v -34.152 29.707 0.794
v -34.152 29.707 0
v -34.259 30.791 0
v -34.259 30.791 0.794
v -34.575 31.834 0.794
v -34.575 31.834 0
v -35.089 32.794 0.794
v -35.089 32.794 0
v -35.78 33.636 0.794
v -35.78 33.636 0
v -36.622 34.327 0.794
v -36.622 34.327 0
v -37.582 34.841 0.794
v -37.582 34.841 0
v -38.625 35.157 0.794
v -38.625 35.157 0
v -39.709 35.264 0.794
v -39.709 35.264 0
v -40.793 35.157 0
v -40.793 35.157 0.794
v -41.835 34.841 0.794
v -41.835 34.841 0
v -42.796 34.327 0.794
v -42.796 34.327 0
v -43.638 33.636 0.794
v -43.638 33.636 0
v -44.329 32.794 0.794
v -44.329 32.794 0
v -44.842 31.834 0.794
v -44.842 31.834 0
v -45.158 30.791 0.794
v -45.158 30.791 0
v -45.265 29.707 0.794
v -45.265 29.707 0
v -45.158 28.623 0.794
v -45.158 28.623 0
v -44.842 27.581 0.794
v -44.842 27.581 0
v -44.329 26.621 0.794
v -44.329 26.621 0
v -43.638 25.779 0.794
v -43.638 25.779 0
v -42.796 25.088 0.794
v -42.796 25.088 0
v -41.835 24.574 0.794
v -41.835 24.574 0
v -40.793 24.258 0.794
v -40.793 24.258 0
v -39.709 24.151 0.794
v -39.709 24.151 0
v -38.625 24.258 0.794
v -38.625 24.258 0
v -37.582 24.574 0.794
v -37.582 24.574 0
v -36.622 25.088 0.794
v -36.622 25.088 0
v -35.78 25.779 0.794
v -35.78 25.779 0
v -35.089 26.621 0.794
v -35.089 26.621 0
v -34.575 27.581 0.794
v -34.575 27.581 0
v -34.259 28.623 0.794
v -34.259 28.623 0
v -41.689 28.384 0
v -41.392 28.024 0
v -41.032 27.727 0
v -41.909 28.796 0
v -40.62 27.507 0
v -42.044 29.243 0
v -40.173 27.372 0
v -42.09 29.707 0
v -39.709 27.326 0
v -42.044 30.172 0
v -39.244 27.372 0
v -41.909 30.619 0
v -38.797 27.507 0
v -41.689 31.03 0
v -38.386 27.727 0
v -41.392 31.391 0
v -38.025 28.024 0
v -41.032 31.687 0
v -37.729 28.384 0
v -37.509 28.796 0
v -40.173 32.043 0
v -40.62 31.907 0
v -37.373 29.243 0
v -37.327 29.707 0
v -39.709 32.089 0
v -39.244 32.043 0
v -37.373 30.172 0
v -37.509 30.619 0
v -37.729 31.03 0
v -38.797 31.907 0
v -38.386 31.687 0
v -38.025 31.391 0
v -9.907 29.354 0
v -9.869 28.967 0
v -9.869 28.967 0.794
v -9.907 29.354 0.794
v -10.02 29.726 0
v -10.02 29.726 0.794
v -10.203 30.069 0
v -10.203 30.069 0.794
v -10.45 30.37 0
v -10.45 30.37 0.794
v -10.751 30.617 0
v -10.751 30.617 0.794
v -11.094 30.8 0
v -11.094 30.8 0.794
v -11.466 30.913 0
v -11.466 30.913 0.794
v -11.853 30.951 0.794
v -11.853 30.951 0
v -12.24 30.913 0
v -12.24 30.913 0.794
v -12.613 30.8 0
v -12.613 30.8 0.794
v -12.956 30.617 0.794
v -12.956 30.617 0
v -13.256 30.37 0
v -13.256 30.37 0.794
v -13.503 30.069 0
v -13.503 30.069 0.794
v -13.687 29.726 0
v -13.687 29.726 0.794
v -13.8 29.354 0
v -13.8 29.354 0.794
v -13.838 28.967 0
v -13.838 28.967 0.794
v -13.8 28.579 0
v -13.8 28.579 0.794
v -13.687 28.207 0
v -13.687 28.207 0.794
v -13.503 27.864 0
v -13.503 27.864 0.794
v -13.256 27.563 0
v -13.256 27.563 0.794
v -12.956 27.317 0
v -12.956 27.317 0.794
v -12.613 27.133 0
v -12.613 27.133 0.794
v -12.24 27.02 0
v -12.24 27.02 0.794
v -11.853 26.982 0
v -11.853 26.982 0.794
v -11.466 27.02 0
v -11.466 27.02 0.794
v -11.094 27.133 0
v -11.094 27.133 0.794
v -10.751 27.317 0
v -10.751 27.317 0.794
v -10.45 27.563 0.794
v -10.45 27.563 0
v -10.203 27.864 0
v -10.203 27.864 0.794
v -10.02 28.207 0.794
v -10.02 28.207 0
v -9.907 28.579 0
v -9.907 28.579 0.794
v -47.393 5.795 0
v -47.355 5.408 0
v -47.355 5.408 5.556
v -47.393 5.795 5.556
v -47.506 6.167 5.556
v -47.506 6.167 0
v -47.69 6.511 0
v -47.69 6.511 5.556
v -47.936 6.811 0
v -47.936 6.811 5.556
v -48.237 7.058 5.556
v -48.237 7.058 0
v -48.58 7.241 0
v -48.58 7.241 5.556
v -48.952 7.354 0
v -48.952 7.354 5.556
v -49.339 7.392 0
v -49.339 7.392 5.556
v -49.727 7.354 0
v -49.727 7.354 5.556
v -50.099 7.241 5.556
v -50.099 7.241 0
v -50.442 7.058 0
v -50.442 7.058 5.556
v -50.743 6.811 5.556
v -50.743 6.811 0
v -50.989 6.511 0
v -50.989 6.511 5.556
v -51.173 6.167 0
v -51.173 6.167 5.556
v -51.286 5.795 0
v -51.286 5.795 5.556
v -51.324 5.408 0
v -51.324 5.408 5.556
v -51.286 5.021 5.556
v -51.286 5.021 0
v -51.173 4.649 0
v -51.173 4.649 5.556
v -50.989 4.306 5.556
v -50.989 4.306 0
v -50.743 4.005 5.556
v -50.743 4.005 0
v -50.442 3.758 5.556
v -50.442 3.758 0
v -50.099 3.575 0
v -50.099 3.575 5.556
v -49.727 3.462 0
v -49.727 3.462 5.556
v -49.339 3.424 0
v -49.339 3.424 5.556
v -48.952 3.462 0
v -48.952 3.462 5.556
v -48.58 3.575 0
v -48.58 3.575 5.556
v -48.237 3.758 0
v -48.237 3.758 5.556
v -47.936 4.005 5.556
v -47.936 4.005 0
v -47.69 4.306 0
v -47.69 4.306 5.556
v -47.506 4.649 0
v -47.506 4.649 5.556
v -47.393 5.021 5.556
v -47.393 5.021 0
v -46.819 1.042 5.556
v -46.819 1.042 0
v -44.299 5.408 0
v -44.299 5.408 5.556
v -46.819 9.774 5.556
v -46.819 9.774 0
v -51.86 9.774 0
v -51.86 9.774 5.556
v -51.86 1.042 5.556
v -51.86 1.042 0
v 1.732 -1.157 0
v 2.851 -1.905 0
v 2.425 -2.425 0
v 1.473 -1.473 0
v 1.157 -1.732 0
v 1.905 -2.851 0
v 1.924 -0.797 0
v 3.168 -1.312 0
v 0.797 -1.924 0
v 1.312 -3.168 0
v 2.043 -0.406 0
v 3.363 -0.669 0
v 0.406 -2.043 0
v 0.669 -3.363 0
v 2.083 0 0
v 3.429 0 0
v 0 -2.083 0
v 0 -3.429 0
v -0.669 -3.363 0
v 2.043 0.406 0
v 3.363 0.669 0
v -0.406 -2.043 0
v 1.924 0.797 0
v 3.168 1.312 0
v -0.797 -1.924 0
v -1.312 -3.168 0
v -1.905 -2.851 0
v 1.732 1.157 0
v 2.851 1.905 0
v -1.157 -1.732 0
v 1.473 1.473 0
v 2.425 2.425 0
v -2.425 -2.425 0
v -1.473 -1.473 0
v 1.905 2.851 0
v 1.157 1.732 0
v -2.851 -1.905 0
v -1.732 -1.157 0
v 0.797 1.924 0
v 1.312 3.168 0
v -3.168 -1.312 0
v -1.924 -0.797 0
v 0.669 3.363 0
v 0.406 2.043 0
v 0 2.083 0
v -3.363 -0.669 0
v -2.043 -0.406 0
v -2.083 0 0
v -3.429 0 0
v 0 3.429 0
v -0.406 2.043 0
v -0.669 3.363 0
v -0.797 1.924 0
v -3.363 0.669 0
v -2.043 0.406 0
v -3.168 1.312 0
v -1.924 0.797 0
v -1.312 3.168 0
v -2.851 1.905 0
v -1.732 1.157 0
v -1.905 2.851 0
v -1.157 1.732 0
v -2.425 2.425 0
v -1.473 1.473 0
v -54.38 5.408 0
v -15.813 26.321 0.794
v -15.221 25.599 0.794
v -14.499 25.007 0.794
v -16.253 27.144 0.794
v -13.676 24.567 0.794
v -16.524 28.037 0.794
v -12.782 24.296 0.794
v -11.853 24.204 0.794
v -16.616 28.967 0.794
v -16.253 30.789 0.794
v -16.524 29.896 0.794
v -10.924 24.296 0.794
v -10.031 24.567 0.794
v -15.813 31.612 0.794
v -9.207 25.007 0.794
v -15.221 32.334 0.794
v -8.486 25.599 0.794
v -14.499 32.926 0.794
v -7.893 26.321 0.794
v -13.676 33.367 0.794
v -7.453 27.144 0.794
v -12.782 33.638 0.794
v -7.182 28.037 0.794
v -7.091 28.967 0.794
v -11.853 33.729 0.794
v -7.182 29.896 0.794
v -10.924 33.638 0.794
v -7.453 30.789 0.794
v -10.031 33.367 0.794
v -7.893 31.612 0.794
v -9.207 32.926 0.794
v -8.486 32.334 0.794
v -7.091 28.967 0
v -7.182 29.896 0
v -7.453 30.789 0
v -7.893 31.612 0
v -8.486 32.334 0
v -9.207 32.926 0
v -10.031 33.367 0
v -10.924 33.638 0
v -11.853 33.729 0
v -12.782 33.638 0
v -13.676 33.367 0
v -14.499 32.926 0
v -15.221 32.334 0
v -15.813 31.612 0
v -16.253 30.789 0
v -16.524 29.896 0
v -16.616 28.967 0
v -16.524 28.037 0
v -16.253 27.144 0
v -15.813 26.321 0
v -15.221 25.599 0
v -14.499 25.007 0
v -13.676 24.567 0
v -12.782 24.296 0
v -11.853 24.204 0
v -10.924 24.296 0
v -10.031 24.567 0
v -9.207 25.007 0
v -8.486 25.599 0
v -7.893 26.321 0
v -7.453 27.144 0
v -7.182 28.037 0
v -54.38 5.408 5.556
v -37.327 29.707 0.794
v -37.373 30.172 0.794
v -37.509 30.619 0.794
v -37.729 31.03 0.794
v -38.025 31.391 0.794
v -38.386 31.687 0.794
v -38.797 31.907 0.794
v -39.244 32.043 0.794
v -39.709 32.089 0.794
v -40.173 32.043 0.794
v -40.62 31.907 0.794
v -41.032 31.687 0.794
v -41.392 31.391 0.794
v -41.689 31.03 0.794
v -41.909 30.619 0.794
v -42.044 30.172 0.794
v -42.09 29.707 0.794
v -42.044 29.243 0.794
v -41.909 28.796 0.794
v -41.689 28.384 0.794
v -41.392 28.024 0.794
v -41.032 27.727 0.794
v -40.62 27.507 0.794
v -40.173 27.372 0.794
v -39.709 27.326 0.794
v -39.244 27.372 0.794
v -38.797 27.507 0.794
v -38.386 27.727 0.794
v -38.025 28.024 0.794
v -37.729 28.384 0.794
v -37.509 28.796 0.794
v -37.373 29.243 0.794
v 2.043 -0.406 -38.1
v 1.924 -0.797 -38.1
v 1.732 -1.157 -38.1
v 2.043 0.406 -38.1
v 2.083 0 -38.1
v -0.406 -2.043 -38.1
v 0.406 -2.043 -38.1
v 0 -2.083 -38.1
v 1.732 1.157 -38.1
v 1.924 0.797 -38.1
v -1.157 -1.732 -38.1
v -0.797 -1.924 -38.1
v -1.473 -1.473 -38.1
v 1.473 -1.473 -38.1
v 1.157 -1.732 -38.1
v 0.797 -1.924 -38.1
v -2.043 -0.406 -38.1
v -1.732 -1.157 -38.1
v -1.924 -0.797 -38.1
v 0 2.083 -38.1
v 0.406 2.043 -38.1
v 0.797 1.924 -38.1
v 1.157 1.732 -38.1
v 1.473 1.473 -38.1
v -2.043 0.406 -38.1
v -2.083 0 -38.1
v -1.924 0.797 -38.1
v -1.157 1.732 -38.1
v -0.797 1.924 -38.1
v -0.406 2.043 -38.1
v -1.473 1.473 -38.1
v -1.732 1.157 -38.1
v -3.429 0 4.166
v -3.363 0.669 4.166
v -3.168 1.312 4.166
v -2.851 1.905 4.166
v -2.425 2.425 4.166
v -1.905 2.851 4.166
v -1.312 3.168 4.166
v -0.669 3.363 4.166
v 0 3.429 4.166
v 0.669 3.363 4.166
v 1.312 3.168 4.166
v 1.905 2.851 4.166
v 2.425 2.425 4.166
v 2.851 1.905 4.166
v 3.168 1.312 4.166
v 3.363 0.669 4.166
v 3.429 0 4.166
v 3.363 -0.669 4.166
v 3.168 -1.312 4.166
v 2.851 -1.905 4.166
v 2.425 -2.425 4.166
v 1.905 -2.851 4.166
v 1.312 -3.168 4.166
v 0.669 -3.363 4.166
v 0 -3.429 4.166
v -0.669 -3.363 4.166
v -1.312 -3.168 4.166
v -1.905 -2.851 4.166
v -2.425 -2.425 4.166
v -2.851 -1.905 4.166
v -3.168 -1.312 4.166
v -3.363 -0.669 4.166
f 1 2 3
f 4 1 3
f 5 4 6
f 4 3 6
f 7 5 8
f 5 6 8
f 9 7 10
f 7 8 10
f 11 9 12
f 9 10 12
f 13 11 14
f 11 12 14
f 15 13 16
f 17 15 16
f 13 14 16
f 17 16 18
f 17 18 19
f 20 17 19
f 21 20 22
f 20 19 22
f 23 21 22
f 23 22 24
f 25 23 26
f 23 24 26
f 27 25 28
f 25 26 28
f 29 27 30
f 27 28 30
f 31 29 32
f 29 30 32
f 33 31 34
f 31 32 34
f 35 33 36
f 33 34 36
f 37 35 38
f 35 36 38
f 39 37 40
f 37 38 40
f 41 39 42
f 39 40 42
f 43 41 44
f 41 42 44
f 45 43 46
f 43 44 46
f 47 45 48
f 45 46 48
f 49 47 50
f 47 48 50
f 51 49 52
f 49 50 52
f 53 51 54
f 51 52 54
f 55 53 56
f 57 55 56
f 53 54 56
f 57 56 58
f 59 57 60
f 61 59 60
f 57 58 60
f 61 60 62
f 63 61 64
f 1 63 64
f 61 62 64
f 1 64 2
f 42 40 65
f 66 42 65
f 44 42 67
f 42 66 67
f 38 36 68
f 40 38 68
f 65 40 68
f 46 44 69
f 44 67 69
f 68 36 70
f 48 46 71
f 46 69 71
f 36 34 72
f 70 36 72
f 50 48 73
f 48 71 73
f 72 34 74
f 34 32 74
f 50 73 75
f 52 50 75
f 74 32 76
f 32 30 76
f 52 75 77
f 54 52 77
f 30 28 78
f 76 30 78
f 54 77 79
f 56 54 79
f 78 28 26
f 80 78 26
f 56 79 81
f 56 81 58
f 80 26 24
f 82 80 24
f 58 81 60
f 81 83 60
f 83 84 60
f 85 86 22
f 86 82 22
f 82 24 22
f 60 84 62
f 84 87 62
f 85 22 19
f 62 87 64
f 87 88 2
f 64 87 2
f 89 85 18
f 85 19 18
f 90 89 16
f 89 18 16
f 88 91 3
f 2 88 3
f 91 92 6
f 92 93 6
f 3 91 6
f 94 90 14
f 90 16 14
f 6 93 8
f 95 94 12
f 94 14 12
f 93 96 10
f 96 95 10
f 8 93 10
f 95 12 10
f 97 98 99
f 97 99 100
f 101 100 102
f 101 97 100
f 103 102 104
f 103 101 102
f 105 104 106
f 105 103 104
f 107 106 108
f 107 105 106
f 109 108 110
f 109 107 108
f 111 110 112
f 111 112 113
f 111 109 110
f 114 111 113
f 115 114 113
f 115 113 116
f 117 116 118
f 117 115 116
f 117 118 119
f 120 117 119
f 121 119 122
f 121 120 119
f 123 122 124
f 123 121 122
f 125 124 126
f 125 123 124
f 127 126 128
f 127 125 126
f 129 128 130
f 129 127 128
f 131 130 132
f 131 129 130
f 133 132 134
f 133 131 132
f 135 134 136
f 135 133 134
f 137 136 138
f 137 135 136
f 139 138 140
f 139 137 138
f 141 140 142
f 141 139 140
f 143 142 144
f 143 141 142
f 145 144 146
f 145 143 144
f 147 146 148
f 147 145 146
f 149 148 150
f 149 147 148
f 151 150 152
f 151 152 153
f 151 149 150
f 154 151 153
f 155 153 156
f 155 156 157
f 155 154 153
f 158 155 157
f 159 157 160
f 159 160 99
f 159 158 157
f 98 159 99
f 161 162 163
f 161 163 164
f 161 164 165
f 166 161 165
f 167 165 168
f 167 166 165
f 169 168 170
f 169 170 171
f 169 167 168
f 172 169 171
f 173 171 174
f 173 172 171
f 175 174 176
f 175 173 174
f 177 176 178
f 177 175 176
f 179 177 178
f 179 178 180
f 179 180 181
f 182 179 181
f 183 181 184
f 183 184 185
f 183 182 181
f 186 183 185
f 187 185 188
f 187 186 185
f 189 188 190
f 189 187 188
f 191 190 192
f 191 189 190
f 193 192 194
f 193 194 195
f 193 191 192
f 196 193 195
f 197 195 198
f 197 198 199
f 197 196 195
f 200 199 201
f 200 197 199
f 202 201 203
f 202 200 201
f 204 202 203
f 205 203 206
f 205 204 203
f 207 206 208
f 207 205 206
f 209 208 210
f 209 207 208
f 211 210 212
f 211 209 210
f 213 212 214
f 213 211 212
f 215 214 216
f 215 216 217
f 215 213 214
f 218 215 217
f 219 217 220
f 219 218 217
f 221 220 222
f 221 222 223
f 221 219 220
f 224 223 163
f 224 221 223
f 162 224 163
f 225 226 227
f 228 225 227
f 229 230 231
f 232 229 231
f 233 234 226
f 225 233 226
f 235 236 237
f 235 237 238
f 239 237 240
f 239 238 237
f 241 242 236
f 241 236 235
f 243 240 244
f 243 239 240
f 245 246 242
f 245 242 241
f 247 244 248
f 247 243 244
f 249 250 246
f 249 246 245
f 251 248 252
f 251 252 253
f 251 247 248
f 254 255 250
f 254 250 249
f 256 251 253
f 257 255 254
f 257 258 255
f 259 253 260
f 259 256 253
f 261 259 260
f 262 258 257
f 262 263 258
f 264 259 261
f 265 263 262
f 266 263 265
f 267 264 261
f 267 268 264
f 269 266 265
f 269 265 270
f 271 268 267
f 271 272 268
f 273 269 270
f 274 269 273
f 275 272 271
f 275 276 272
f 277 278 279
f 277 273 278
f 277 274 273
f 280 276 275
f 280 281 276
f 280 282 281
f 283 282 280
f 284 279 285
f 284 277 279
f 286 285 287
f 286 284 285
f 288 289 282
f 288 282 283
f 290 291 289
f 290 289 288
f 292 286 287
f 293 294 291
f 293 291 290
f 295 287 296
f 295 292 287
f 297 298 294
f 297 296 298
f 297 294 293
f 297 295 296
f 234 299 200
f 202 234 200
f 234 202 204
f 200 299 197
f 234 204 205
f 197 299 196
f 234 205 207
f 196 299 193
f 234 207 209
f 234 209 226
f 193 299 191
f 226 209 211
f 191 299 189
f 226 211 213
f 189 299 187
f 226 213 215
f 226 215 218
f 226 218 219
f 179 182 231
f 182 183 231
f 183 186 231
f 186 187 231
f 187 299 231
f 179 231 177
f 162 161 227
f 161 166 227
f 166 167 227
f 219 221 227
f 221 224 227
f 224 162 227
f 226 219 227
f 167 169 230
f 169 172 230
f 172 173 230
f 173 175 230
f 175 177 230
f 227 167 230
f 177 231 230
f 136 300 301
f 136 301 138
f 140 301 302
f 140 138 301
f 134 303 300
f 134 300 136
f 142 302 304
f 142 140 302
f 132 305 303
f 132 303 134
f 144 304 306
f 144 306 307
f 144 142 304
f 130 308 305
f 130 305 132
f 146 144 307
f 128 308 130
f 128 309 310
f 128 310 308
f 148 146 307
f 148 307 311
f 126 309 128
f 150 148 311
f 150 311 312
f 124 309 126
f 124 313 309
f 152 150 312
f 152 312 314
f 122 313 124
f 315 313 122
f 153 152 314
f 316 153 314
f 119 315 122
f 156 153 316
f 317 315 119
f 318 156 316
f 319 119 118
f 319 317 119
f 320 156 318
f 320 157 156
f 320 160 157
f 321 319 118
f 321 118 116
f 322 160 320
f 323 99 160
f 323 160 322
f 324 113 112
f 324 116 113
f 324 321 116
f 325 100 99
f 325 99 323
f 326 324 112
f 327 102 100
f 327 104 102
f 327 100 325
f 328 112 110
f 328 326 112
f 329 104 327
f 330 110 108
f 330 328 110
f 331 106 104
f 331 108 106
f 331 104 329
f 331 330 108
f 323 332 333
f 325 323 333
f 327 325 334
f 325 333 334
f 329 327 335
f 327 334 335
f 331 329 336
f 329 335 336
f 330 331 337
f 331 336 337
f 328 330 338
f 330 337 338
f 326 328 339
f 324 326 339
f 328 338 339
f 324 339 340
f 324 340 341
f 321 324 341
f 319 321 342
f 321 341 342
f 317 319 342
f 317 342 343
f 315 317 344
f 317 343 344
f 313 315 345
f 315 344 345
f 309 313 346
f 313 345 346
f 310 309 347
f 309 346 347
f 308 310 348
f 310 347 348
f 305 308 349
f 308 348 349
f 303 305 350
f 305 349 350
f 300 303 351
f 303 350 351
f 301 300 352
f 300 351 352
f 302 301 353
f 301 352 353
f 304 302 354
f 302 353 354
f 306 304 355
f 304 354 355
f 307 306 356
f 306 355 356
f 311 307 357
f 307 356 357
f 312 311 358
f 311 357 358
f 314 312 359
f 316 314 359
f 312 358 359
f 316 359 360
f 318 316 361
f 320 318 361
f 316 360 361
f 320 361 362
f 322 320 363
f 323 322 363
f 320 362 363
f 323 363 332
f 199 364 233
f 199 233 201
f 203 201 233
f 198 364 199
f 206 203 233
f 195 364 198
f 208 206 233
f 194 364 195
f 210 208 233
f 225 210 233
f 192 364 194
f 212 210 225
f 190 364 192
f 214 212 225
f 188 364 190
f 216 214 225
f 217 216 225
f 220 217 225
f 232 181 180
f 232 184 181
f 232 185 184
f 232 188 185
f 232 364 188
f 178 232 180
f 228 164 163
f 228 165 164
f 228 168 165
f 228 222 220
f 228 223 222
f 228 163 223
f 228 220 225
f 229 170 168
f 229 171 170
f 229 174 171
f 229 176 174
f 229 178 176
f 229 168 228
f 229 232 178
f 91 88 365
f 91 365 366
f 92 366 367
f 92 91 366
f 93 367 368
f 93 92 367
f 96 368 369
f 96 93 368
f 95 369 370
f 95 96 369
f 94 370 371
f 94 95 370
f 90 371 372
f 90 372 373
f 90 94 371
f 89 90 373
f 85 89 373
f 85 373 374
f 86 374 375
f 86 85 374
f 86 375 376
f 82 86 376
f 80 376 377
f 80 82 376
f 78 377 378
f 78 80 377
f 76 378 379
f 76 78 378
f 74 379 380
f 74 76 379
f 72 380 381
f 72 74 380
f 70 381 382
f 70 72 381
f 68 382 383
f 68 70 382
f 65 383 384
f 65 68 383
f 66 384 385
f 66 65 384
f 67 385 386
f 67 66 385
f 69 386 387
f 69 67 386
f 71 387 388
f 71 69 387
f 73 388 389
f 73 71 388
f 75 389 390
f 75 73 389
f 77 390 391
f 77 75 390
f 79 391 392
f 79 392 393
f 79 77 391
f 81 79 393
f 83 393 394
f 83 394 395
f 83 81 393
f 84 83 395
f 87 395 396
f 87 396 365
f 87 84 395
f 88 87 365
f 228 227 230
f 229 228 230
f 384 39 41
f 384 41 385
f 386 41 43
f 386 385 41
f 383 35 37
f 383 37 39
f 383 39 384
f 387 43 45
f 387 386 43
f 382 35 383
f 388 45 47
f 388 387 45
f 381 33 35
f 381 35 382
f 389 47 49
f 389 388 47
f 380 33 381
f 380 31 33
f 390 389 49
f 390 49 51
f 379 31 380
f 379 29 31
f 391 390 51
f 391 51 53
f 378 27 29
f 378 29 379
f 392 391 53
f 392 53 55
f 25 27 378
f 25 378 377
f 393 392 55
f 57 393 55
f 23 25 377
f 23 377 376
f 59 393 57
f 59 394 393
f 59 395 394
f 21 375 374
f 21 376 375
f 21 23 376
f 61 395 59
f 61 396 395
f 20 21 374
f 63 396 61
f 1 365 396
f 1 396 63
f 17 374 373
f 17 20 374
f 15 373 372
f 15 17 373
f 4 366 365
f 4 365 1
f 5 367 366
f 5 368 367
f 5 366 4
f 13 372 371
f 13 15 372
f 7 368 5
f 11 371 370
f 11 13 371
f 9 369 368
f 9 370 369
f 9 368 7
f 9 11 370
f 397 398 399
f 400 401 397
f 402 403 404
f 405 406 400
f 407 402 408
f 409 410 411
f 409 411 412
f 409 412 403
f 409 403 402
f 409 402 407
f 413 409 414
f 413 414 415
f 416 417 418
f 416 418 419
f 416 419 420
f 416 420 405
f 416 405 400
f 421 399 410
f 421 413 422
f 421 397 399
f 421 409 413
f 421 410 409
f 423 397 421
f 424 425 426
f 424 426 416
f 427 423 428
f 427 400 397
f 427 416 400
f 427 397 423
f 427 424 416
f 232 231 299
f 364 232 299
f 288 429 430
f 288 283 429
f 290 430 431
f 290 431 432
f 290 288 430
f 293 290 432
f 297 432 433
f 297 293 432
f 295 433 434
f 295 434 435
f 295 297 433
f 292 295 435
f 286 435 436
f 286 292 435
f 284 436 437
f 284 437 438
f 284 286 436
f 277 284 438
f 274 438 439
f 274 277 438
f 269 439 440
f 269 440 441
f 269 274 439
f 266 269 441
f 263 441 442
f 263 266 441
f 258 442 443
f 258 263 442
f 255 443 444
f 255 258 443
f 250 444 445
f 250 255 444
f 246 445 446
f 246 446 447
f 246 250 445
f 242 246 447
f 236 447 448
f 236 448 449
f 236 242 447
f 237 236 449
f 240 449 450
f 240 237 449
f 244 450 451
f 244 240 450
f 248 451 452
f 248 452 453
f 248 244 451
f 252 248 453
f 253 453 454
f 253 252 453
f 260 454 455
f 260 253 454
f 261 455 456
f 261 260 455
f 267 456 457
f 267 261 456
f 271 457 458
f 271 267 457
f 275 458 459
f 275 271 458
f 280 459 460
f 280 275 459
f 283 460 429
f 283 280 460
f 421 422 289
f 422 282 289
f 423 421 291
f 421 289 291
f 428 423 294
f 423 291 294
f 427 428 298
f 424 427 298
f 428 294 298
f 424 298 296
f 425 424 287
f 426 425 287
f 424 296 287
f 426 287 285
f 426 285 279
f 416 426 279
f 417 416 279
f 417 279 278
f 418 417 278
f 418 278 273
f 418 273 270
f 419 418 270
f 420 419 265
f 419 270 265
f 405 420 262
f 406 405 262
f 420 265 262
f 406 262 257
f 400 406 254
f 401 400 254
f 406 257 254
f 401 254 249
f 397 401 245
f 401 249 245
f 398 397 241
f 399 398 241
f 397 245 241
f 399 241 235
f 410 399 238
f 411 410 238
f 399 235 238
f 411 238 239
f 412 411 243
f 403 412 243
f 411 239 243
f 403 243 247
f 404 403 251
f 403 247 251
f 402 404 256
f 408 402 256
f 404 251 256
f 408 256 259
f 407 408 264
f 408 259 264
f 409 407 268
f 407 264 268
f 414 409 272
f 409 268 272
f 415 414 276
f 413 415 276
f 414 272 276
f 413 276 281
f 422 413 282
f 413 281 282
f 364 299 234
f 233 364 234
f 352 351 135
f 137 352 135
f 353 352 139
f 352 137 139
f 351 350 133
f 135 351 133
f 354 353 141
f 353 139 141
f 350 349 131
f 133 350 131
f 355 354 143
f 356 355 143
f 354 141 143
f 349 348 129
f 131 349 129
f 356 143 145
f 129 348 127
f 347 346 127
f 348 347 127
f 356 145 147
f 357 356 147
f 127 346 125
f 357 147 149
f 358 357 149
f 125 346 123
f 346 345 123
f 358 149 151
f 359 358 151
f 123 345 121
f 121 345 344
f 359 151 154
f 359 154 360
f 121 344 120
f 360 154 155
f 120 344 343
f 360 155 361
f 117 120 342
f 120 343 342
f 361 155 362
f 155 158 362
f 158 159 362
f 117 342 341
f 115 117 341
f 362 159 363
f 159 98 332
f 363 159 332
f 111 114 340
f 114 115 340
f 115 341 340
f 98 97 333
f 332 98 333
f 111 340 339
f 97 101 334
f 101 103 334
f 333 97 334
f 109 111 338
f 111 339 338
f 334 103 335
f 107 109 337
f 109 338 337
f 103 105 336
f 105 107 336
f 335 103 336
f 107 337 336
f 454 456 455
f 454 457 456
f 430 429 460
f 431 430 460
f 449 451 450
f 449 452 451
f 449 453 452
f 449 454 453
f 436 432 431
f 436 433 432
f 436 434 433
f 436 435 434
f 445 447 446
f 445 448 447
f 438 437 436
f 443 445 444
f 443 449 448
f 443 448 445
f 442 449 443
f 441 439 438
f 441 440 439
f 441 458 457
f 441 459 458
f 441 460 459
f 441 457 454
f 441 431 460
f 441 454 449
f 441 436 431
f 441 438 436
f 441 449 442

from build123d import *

# Parameters (mm, degrees)
F0_W     = 2.0828
F0_H     = 38.1
F2_R     = 5.55625
F2_R_2   = 2.38125
F3_DEPTH = 0.79375
F4_R     = 4.7625
F4_R_2   = 1.984375
F5_DEPTH = 0.79375
F6_R     = 1.984375
F7_DEPTH = 5.55625


with BuildPart() as f1:
    # F0 (on Front) → F1 (revolve)
    with BuildSketch(Plane.XZ):
        with Locations((-1.0414, -19.05)):
            Rectangle(F0_W, F0_H)
        Polygon((-2.0828, 0), (0, 0), (0, 4.1656), (-3.429, 4.1656), (-3.429, 0), align=None)
    revolve(axis=Axis((0, 0, -19.05), (0, 0, -1)))


with BuildPart() as f3:
    # F2 (on Top) → F3 (new body)
    with BuildSketch(Plane.XY):
        with Locations((-39.708667, 29.707419)):
            Circle(F2_R)
        with Locations((-39.708667, 29.707419)):
            Circle(F2_R_2, mode=Mode.SUBTRACT)
    extrude(amount=F3_DEPTH)


with BuildPart() as f5:
    # F4 (on Top) → F5 (new body)
    with BuildSketch(Plane.XY):
        with Locations((-11.853334, 28.966583)):
            Circle(F4_R)
        with Locations((-11.853334, 28.966583)):
            Circle(F4_R_2, mode=Mode.SUBTRACT)
    extrude(amount=F5_DEPTH)


with BuildPart() as f7:
    # F6 (on Top) → F7 (new body)
    with BuildSketch(Plane.XY):
        Polygon((-46.819005, 9.773709), (-51.859994, 9.773709), (-54.380489, 5.408084), (-51.859994, 1.042459), (-46.819005, 1.042459), (-44.29851, 5.408084), align=None)
        with Locations((-49.339499, 5.408084)):
            Circle(F6_R, mode=Mode.SUBTRACT)
    extrude(amount=F7_DEPTH)


solid = Compound([f1.part, f3.part, f5.part, f7.part])
